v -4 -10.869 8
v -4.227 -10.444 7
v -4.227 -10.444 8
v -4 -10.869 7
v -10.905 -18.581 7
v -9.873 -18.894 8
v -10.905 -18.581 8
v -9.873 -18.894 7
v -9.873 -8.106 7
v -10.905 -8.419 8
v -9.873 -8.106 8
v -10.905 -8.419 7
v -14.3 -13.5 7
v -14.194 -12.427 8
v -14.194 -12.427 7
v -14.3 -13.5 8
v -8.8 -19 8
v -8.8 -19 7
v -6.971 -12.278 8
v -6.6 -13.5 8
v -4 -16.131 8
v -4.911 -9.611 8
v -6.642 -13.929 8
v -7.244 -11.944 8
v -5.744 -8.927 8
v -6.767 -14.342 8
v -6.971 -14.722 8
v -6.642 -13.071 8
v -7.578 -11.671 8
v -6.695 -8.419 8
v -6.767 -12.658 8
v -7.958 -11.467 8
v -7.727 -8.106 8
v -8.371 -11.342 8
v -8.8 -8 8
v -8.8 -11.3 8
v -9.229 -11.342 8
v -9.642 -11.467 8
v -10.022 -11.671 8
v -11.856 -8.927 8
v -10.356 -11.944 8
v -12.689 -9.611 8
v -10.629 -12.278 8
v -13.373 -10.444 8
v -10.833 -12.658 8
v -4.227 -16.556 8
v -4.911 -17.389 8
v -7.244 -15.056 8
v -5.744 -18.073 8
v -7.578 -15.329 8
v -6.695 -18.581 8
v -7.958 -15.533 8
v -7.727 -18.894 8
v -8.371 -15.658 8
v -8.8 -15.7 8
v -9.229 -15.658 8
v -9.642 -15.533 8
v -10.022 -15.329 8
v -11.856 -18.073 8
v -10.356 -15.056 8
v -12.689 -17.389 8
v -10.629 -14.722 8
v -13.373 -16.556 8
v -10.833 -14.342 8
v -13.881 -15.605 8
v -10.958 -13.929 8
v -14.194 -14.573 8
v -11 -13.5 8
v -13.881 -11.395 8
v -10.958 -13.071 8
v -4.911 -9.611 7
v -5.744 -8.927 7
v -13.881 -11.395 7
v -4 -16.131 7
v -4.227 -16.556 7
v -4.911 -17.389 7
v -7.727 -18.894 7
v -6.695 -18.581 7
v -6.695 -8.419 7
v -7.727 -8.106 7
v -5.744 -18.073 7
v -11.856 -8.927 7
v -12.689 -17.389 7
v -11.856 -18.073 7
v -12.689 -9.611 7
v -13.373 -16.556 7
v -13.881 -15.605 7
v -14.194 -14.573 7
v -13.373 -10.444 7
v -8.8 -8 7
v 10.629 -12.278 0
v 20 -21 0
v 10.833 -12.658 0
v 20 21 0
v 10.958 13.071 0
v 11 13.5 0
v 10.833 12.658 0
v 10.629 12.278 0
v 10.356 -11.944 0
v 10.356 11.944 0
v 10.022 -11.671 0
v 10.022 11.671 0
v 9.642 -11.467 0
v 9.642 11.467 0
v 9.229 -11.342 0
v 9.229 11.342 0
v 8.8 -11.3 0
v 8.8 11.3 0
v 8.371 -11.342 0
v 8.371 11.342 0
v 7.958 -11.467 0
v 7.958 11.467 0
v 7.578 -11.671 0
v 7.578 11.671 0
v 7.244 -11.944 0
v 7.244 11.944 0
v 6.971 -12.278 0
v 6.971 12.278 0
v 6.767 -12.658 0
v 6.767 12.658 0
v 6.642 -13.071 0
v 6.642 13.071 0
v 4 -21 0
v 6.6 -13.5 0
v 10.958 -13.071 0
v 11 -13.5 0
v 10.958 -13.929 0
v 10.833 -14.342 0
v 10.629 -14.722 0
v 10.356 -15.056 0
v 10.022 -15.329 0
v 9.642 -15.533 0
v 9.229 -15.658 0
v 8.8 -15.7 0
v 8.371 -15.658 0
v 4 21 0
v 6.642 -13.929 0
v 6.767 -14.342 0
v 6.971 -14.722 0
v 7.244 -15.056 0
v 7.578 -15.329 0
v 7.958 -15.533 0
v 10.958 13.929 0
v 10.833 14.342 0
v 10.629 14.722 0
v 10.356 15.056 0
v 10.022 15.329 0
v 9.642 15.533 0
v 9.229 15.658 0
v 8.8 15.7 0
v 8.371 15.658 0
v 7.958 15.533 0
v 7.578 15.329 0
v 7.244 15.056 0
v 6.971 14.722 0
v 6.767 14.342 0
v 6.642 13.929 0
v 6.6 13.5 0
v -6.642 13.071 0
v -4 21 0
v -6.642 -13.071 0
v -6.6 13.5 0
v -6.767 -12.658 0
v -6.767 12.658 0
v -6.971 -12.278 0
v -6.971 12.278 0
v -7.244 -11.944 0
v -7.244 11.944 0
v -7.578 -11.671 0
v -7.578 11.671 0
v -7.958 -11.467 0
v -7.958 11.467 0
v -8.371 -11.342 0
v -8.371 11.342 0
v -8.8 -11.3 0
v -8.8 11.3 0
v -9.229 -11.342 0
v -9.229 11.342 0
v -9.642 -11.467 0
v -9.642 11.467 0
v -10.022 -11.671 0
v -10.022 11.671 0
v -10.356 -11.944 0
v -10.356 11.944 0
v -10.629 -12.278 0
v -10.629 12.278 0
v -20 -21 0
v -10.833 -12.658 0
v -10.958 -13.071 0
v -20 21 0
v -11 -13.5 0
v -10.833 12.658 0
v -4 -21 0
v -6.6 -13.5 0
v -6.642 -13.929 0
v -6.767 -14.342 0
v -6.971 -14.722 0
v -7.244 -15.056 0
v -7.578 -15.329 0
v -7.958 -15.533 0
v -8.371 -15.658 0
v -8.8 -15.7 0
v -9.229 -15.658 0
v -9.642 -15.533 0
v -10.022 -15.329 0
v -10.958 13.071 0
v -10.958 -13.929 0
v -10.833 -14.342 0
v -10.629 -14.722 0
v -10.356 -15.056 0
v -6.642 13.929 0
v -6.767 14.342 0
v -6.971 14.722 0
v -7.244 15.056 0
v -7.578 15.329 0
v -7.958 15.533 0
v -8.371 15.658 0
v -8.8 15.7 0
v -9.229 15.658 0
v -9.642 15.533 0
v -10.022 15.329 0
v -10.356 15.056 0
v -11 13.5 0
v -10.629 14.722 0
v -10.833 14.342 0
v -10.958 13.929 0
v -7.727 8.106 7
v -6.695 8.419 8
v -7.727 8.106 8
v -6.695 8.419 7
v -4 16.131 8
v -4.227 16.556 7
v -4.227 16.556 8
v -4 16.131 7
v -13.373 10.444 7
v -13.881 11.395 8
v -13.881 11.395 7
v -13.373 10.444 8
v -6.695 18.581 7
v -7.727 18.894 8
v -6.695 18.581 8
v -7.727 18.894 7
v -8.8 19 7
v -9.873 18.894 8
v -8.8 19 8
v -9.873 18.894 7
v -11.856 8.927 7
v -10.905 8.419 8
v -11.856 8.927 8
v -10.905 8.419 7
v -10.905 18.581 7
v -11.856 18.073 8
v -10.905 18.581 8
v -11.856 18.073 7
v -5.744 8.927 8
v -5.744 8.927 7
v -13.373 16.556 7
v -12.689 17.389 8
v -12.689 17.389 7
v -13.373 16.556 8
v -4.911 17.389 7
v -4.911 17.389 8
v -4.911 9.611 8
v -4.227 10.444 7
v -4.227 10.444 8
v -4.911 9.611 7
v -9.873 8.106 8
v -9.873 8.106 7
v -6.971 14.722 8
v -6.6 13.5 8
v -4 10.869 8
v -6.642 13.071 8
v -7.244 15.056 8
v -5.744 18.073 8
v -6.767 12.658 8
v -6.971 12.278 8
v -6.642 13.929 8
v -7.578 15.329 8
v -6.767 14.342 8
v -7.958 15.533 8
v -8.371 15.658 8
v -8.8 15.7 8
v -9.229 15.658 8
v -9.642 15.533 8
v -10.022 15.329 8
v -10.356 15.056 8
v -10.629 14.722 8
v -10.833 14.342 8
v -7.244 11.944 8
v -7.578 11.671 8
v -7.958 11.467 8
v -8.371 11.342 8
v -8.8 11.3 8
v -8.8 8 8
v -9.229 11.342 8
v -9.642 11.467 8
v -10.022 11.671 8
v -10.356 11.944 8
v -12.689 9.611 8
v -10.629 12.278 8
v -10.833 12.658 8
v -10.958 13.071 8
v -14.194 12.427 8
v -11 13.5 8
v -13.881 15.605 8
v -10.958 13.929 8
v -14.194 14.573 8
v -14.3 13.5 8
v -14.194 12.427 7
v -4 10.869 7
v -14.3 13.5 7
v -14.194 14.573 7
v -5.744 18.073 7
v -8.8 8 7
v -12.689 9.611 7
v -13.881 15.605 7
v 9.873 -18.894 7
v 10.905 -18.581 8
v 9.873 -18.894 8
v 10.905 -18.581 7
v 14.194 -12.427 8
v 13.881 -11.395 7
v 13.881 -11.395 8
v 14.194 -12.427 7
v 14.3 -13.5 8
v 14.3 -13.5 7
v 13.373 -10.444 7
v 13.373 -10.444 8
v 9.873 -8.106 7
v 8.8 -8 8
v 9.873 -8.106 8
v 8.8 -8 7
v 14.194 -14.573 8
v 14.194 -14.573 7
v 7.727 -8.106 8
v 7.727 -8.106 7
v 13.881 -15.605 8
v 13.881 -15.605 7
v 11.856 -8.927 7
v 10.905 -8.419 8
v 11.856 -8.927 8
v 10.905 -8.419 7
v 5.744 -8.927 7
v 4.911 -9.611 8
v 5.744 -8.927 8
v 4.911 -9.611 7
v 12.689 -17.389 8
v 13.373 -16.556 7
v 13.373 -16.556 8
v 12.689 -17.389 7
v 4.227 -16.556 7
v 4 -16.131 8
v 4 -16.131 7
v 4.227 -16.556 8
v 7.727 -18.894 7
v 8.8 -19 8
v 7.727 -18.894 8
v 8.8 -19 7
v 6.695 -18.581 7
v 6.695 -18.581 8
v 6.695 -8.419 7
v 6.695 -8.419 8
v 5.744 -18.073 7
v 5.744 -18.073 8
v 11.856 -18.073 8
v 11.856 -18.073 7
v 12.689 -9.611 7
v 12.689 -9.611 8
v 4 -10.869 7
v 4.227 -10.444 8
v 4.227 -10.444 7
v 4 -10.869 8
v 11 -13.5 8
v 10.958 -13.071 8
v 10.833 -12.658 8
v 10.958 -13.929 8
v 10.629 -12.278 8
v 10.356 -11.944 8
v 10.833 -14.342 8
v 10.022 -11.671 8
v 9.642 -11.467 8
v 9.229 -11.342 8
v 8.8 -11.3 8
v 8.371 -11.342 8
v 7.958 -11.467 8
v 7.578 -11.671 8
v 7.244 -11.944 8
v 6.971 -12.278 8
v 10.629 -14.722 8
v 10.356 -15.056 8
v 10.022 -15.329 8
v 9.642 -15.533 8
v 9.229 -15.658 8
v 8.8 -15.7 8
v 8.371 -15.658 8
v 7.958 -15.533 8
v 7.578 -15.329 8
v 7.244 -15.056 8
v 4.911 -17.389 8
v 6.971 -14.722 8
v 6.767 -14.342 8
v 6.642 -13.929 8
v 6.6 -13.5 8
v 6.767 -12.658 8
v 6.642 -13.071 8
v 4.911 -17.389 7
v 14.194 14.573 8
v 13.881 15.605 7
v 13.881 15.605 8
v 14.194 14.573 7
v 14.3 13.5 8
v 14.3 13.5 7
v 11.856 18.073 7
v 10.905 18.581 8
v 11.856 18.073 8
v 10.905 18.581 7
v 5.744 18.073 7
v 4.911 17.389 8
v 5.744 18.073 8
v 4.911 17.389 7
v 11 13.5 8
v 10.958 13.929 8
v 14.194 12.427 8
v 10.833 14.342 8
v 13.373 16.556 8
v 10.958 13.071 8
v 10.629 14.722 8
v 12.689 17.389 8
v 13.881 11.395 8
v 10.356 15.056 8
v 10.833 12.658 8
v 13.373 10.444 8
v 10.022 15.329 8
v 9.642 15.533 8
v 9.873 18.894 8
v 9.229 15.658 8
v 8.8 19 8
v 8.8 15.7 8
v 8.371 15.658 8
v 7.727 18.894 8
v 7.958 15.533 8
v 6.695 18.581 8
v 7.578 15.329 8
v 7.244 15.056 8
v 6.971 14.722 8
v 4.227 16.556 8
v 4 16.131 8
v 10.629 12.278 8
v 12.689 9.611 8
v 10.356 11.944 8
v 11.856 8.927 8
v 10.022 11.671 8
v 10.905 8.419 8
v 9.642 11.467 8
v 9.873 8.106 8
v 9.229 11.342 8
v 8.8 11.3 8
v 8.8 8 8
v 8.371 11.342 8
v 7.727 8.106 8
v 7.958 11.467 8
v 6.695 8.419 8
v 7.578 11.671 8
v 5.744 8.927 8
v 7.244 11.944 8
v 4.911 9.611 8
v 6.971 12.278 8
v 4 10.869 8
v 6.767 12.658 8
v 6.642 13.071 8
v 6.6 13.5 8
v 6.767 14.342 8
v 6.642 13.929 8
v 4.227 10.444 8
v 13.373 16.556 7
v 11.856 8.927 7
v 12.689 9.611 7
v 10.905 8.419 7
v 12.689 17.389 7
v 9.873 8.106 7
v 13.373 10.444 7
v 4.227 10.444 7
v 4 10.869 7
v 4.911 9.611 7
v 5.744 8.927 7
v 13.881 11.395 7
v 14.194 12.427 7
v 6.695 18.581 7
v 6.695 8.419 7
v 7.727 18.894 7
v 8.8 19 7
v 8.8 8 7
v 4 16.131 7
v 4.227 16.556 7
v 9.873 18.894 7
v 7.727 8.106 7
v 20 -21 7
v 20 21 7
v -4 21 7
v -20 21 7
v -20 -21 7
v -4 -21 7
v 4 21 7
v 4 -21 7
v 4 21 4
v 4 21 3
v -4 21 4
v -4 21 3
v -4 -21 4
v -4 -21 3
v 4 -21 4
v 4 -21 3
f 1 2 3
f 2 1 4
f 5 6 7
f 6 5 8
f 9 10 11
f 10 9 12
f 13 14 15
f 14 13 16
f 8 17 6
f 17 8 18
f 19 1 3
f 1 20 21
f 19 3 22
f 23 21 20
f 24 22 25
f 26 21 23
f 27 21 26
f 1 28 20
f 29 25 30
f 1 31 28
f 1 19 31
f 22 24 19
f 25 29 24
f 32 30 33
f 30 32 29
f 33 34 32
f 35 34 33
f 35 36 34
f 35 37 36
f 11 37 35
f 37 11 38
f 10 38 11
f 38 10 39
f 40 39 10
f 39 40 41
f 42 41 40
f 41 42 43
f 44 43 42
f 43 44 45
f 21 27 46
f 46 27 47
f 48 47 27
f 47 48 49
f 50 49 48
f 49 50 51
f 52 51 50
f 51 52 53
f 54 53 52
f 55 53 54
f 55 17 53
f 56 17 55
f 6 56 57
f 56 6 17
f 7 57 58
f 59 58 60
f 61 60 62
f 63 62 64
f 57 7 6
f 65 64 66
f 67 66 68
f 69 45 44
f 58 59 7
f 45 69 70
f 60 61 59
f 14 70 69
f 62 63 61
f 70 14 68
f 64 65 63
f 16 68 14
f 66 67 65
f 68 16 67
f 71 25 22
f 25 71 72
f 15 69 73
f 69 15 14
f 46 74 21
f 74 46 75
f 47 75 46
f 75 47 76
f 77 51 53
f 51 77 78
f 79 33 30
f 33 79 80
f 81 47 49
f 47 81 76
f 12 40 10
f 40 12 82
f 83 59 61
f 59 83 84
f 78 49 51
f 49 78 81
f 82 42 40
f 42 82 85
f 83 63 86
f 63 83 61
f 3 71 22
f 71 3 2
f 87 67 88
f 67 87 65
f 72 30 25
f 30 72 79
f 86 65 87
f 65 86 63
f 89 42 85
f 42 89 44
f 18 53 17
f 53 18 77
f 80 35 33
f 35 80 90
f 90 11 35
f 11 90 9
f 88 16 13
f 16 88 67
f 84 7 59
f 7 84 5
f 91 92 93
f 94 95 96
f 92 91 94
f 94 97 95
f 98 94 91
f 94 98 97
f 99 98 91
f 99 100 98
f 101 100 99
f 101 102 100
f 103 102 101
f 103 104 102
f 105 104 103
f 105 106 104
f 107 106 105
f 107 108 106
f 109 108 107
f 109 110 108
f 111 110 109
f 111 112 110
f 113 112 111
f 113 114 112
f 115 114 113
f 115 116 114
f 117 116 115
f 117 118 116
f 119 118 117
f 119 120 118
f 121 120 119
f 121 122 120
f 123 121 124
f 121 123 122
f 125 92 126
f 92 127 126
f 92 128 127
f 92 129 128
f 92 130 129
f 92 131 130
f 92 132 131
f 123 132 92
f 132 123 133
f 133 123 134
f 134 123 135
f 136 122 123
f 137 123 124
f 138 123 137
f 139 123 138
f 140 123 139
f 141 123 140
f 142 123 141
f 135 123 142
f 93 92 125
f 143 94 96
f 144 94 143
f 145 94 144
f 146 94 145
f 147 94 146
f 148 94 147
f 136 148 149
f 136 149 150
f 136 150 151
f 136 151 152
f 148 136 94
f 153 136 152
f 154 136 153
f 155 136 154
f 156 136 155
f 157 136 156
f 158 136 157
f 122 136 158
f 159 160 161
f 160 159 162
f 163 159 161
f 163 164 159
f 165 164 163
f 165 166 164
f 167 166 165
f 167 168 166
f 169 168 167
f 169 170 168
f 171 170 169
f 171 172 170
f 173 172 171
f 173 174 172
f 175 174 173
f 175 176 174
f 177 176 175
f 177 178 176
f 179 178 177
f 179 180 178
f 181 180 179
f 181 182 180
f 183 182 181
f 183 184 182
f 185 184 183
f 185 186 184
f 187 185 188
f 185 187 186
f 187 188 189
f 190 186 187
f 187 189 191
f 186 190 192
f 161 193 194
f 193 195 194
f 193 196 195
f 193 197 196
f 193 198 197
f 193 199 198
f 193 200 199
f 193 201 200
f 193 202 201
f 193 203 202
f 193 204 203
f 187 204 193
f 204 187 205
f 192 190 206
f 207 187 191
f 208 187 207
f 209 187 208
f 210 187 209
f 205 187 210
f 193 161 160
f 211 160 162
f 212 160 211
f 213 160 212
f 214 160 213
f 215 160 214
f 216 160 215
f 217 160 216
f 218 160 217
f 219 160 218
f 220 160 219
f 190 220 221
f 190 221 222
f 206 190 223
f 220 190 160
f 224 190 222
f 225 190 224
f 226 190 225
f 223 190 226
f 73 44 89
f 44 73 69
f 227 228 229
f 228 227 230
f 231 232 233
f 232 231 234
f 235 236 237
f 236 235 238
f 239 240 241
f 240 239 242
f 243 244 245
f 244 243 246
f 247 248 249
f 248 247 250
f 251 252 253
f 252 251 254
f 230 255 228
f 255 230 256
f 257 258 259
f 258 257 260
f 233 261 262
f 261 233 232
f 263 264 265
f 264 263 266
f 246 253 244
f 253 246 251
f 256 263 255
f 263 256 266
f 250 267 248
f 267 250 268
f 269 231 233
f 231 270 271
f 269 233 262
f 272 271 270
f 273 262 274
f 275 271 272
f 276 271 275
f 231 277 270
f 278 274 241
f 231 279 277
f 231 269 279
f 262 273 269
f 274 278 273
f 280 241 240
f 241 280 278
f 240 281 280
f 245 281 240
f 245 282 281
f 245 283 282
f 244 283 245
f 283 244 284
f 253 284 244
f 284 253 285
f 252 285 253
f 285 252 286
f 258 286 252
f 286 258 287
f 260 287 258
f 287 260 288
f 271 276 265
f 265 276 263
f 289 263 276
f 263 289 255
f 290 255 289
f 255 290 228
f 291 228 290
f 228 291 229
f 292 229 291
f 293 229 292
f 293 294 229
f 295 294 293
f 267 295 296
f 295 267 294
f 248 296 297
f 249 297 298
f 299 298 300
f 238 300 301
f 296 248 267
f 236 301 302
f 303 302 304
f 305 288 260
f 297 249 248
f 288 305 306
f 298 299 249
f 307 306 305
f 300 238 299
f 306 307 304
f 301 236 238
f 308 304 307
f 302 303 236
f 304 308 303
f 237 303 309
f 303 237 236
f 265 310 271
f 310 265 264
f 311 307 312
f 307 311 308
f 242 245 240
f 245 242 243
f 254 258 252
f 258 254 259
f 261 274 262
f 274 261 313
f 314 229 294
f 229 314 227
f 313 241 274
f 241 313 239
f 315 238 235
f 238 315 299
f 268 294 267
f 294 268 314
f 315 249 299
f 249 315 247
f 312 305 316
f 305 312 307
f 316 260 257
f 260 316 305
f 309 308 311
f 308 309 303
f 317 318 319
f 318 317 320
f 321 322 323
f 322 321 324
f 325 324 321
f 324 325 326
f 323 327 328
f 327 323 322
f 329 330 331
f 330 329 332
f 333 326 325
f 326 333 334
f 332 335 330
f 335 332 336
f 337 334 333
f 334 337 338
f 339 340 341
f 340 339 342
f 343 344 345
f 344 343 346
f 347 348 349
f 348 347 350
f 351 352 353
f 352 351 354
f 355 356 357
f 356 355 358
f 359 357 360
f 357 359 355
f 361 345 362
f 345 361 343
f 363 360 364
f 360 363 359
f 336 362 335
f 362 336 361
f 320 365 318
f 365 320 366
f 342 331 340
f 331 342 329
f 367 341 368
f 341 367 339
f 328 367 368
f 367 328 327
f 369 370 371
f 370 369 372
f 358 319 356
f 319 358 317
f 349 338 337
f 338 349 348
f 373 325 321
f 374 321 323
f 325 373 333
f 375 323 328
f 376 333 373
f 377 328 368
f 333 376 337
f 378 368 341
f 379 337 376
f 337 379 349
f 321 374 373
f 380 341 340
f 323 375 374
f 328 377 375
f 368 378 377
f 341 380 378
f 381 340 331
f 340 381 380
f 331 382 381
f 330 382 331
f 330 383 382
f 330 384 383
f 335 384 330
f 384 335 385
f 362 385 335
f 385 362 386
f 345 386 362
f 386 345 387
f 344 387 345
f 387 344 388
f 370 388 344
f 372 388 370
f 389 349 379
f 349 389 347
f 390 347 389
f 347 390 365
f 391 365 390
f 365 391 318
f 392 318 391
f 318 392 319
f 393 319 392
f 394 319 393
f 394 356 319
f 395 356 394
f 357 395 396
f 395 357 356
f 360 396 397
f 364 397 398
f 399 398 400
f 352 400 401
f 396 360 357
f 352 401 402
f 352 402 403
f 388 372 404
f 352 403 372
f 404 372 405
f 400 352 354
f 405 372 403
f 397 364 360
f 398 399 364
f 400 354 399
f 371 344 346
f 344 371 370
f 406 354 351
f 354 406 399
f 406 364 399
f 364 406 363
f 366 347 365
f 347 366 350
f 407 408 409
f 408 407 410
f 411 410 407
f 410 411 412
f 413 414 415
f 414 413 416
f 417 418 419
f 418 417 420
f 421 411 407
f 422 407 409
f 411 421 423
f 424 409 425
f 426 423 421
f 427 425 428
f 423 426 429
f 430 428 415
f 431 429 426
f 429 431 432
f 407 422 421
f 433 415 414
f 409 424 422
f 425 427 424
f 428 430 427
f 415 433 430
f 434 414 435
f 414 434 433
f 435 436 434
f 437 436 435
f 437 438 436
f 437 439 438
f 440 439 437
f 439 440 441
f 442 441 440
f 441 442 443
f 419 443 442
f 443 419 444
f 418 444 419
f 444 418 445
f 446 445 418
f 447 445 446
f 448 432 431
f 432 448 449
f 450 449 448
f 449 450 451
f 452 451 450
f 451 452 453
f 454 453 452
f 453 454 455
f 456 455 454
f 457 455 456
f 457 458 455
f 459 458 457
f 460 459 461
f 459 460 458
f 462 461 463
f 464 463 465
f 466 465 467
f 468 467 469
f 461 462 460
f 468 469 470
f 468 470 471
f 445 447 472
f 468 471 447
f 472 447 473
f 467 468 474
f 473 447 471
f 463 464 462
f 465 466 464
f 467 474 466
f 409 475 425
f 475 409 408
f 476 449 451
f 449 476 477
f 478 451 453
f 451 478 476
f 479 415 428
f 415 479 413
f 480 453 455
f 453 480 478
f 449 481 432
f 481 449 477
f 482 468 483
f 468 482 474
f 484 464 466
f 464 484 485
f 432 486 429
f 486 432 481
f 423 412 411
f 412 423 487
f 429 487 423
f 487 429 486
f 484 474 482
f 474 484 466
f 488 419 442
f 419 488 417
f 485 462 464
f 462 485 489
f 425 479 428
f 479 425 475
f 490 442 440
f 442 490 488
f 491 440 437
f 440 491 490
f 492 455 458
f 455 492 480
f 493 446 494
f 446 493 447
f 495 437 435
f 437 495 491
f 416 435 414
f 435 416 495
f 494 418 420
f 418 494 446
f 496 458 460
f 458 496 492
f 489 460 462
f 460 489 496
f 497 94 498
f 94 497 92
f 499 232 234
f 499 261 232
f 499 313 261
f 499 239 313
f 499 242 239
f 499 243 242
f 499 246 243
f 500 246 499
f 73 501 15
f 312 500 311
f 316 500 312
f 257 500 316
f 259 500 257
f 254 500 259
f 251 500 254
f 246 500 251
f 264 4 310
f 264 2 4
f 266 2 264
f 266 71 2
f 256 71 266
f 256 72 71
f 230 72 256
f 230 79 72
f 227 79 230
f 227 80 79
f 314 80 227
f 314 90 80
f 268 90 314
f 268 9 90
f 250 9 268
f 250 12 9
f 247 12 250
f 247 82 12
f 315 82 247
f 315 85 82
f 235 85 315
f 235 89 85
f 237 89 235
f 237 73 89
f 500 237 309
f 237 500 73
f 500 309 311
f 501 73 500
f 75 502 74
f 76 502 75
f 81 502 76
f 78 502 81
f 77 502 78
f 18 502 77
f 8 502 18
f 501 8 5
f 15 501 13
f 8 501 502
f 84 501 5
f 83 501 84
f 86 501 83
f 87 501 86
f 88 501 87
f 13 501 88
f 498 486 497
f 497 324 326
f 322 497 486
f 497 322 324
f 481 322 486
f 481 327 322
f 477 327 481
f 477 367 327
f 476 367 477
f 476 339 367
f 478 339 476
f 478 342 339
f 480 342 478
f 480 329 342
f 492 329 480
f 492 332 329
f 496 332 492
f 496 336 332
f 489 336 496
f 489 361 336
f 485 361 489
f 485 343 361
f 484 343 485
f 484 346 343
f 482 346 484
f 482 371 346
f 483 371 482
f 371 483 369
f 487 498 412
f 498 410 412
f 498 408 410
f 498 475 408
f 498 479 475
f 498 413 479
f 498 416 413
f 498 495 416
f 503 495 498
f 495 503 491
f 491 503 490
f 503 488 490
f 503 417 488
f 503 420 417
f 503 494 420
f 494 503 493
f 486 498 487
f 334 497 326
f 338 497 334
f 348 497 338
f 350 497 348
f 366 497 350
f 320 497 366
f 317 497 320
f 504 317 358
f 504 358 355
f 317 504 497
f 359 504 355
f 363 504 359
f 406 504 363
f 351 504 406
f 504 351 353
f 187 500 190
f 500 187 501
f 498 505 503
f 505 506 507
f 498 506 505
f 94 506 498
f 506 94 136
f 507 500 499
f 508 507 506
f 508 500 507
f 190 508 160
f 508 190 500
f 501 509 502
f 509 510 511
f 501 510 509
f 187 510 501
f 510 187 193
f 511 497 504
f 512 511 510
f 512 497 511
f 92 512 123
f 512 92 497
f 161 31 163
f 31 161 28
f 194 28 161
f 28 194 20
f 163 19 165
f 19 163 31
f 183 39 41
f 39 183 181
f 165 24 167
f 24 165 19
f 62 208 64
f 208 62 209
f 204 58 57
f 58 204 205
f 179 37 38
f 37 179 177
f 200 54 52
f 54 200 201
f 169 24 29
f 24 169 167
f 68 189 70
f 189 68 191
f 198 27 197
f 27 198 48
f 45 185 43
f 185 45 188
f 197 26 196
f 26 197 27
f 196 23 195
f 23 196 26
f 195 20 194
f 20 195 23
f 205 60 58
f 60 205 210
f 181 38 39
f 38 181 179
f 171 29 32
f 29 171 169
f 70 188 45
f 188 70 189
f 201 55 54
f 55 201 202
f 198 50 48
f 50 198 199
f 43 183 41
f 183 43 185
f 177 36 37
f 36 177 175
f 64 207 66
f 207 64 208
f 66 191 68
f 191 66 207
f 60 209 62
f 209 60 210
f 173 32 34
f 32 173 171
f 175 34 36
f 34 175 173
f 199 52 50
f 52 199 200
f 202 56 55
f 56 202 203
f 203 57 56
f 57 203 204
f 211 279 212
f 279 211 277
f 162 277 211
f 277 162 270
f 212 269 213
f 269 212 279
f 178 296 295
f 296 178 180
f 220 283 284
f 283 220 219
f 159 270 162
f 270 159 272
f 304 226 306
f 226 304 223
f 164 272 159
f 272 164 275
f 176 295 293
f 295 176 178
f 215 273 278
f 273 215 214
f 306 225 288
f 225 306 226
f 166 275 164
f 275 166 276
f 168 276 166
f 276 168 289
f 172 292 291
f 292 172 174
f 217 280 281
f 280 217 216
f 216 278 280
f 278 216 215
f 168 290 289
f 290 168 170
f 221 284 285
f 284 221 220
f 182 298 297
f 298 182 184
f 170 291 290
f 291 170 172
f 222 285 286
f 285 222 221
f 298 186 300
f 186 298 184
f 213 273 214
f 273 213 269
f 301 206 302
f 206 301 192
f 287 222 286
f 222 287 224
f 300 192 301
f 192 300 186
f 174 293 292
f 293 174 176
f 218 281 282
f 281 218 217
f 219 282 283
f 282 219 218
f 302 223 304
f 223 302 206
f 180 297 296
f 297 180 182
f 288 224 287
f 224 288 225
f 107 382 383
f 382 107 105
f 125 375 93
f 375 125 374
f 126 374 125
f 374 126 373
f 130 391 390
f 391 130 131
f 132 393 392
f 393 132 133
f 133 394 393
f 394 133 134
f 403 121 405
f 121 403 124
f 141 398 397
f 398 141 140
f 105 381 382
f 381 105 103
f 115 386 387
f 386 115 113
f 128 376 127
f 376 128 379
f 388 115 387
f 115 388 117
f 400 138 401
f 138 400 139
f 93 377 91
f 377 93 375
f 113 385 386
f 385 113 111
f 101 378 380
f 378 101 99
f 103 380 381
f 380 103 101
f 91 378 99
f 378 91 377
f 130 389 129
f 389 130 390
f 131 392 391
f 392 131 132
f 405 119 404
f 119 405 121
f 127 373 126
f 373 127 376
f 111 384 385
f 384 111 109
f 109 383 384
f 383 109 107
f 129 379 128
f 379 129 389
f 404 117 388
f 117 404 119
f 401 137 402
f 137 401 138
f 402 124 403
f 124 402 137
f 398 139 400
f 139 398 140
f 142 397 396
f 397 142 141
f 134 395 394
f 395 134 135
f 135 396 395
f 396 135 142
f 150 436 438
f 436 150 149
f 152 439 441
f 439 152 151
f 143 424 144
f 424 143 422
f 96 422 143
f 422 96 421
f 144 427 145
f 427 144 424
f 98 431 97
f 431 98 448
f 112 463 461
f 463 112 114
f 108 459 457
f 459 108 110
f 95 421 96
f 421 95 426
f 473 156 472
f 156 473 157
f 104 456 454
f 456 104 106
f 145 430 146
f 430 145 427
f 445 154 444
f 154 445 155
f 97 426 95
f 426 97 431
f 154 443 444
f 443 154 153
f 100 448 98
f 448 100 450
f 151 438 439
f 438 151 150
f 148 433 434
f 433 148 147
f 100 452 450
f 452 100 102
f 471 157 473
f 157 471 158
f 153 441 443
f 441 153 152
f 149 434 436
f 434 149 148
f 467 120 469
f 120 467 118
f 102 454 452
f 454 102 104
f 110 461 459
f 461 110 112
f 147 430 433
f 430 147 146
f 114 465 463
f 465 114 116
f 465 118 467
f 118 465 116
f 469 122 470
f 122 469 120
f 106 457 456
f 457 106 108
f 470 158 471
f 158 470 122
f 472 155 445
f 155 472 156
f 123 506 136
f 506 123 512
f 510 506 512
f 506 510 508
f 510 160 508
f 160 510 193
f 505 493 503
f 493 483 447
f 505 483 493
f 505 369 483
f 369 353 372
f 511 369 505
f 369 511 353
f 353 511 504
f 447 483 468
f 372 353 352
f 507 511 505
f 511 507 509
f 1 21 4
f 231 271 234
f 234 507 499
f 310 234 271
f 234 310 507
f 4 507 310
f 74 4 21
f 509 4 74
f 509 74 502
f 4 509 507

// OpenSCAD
$fn = 32;

// ----------------------------------------------------------------------
// Living hinge: 40 x 42 mm plates, 1 mm flexible web
// ----------------------------------------------------------------------

// --- parameters (mm) ---
plate_len = 16;           // plate length outside the web
plate_w = 42;             // plate width
thick = 7;                // plate thickness
web_half = 4;             // half width of the flex band
web_t = 1;                // flexible web thickness
web_z = 3;                // web position inside the thickness
boss_d = 11;              // screw boss diameter
boss_h = 8;               // screw boss height
boss_x = 8.8;             // screw boss distance from the web
screw_d = 4.4;            // screw hole

difference() {
  union() {
    /* one flat strip, later thinned at the middle */
    translate([-20, -21, 0]) cube([40, 42, 7]);
    /* screw bosses, sunk 0.5 mm into the plates */
    for (sx = [-8.8, 8.8]) {
      for (sy = [-13.5, 13.5]) {
        translate([sx, sy, 0]) cylinder(h = boss_h, d = boss_d);
      }
    }
  }
  /* channel from below: leaves the web on top of it */
  translate([-4, -23.5, -2.5]) cube([8, 47, 5.5]);
  /* channel from above: thins the web down to web_t */
  translate([-4, -23.5, 4]) cube([8, 47, 5.5]);
  /* screw holes through the bosses */
  for (sx = [-8.8, 8.8]) {
    for (sy = [-13.5, 13.5]) {
      translate([sx, sy, -2.5]) cylinder(h = boss_h + 5, d = screw_d);
    }
  }
}
